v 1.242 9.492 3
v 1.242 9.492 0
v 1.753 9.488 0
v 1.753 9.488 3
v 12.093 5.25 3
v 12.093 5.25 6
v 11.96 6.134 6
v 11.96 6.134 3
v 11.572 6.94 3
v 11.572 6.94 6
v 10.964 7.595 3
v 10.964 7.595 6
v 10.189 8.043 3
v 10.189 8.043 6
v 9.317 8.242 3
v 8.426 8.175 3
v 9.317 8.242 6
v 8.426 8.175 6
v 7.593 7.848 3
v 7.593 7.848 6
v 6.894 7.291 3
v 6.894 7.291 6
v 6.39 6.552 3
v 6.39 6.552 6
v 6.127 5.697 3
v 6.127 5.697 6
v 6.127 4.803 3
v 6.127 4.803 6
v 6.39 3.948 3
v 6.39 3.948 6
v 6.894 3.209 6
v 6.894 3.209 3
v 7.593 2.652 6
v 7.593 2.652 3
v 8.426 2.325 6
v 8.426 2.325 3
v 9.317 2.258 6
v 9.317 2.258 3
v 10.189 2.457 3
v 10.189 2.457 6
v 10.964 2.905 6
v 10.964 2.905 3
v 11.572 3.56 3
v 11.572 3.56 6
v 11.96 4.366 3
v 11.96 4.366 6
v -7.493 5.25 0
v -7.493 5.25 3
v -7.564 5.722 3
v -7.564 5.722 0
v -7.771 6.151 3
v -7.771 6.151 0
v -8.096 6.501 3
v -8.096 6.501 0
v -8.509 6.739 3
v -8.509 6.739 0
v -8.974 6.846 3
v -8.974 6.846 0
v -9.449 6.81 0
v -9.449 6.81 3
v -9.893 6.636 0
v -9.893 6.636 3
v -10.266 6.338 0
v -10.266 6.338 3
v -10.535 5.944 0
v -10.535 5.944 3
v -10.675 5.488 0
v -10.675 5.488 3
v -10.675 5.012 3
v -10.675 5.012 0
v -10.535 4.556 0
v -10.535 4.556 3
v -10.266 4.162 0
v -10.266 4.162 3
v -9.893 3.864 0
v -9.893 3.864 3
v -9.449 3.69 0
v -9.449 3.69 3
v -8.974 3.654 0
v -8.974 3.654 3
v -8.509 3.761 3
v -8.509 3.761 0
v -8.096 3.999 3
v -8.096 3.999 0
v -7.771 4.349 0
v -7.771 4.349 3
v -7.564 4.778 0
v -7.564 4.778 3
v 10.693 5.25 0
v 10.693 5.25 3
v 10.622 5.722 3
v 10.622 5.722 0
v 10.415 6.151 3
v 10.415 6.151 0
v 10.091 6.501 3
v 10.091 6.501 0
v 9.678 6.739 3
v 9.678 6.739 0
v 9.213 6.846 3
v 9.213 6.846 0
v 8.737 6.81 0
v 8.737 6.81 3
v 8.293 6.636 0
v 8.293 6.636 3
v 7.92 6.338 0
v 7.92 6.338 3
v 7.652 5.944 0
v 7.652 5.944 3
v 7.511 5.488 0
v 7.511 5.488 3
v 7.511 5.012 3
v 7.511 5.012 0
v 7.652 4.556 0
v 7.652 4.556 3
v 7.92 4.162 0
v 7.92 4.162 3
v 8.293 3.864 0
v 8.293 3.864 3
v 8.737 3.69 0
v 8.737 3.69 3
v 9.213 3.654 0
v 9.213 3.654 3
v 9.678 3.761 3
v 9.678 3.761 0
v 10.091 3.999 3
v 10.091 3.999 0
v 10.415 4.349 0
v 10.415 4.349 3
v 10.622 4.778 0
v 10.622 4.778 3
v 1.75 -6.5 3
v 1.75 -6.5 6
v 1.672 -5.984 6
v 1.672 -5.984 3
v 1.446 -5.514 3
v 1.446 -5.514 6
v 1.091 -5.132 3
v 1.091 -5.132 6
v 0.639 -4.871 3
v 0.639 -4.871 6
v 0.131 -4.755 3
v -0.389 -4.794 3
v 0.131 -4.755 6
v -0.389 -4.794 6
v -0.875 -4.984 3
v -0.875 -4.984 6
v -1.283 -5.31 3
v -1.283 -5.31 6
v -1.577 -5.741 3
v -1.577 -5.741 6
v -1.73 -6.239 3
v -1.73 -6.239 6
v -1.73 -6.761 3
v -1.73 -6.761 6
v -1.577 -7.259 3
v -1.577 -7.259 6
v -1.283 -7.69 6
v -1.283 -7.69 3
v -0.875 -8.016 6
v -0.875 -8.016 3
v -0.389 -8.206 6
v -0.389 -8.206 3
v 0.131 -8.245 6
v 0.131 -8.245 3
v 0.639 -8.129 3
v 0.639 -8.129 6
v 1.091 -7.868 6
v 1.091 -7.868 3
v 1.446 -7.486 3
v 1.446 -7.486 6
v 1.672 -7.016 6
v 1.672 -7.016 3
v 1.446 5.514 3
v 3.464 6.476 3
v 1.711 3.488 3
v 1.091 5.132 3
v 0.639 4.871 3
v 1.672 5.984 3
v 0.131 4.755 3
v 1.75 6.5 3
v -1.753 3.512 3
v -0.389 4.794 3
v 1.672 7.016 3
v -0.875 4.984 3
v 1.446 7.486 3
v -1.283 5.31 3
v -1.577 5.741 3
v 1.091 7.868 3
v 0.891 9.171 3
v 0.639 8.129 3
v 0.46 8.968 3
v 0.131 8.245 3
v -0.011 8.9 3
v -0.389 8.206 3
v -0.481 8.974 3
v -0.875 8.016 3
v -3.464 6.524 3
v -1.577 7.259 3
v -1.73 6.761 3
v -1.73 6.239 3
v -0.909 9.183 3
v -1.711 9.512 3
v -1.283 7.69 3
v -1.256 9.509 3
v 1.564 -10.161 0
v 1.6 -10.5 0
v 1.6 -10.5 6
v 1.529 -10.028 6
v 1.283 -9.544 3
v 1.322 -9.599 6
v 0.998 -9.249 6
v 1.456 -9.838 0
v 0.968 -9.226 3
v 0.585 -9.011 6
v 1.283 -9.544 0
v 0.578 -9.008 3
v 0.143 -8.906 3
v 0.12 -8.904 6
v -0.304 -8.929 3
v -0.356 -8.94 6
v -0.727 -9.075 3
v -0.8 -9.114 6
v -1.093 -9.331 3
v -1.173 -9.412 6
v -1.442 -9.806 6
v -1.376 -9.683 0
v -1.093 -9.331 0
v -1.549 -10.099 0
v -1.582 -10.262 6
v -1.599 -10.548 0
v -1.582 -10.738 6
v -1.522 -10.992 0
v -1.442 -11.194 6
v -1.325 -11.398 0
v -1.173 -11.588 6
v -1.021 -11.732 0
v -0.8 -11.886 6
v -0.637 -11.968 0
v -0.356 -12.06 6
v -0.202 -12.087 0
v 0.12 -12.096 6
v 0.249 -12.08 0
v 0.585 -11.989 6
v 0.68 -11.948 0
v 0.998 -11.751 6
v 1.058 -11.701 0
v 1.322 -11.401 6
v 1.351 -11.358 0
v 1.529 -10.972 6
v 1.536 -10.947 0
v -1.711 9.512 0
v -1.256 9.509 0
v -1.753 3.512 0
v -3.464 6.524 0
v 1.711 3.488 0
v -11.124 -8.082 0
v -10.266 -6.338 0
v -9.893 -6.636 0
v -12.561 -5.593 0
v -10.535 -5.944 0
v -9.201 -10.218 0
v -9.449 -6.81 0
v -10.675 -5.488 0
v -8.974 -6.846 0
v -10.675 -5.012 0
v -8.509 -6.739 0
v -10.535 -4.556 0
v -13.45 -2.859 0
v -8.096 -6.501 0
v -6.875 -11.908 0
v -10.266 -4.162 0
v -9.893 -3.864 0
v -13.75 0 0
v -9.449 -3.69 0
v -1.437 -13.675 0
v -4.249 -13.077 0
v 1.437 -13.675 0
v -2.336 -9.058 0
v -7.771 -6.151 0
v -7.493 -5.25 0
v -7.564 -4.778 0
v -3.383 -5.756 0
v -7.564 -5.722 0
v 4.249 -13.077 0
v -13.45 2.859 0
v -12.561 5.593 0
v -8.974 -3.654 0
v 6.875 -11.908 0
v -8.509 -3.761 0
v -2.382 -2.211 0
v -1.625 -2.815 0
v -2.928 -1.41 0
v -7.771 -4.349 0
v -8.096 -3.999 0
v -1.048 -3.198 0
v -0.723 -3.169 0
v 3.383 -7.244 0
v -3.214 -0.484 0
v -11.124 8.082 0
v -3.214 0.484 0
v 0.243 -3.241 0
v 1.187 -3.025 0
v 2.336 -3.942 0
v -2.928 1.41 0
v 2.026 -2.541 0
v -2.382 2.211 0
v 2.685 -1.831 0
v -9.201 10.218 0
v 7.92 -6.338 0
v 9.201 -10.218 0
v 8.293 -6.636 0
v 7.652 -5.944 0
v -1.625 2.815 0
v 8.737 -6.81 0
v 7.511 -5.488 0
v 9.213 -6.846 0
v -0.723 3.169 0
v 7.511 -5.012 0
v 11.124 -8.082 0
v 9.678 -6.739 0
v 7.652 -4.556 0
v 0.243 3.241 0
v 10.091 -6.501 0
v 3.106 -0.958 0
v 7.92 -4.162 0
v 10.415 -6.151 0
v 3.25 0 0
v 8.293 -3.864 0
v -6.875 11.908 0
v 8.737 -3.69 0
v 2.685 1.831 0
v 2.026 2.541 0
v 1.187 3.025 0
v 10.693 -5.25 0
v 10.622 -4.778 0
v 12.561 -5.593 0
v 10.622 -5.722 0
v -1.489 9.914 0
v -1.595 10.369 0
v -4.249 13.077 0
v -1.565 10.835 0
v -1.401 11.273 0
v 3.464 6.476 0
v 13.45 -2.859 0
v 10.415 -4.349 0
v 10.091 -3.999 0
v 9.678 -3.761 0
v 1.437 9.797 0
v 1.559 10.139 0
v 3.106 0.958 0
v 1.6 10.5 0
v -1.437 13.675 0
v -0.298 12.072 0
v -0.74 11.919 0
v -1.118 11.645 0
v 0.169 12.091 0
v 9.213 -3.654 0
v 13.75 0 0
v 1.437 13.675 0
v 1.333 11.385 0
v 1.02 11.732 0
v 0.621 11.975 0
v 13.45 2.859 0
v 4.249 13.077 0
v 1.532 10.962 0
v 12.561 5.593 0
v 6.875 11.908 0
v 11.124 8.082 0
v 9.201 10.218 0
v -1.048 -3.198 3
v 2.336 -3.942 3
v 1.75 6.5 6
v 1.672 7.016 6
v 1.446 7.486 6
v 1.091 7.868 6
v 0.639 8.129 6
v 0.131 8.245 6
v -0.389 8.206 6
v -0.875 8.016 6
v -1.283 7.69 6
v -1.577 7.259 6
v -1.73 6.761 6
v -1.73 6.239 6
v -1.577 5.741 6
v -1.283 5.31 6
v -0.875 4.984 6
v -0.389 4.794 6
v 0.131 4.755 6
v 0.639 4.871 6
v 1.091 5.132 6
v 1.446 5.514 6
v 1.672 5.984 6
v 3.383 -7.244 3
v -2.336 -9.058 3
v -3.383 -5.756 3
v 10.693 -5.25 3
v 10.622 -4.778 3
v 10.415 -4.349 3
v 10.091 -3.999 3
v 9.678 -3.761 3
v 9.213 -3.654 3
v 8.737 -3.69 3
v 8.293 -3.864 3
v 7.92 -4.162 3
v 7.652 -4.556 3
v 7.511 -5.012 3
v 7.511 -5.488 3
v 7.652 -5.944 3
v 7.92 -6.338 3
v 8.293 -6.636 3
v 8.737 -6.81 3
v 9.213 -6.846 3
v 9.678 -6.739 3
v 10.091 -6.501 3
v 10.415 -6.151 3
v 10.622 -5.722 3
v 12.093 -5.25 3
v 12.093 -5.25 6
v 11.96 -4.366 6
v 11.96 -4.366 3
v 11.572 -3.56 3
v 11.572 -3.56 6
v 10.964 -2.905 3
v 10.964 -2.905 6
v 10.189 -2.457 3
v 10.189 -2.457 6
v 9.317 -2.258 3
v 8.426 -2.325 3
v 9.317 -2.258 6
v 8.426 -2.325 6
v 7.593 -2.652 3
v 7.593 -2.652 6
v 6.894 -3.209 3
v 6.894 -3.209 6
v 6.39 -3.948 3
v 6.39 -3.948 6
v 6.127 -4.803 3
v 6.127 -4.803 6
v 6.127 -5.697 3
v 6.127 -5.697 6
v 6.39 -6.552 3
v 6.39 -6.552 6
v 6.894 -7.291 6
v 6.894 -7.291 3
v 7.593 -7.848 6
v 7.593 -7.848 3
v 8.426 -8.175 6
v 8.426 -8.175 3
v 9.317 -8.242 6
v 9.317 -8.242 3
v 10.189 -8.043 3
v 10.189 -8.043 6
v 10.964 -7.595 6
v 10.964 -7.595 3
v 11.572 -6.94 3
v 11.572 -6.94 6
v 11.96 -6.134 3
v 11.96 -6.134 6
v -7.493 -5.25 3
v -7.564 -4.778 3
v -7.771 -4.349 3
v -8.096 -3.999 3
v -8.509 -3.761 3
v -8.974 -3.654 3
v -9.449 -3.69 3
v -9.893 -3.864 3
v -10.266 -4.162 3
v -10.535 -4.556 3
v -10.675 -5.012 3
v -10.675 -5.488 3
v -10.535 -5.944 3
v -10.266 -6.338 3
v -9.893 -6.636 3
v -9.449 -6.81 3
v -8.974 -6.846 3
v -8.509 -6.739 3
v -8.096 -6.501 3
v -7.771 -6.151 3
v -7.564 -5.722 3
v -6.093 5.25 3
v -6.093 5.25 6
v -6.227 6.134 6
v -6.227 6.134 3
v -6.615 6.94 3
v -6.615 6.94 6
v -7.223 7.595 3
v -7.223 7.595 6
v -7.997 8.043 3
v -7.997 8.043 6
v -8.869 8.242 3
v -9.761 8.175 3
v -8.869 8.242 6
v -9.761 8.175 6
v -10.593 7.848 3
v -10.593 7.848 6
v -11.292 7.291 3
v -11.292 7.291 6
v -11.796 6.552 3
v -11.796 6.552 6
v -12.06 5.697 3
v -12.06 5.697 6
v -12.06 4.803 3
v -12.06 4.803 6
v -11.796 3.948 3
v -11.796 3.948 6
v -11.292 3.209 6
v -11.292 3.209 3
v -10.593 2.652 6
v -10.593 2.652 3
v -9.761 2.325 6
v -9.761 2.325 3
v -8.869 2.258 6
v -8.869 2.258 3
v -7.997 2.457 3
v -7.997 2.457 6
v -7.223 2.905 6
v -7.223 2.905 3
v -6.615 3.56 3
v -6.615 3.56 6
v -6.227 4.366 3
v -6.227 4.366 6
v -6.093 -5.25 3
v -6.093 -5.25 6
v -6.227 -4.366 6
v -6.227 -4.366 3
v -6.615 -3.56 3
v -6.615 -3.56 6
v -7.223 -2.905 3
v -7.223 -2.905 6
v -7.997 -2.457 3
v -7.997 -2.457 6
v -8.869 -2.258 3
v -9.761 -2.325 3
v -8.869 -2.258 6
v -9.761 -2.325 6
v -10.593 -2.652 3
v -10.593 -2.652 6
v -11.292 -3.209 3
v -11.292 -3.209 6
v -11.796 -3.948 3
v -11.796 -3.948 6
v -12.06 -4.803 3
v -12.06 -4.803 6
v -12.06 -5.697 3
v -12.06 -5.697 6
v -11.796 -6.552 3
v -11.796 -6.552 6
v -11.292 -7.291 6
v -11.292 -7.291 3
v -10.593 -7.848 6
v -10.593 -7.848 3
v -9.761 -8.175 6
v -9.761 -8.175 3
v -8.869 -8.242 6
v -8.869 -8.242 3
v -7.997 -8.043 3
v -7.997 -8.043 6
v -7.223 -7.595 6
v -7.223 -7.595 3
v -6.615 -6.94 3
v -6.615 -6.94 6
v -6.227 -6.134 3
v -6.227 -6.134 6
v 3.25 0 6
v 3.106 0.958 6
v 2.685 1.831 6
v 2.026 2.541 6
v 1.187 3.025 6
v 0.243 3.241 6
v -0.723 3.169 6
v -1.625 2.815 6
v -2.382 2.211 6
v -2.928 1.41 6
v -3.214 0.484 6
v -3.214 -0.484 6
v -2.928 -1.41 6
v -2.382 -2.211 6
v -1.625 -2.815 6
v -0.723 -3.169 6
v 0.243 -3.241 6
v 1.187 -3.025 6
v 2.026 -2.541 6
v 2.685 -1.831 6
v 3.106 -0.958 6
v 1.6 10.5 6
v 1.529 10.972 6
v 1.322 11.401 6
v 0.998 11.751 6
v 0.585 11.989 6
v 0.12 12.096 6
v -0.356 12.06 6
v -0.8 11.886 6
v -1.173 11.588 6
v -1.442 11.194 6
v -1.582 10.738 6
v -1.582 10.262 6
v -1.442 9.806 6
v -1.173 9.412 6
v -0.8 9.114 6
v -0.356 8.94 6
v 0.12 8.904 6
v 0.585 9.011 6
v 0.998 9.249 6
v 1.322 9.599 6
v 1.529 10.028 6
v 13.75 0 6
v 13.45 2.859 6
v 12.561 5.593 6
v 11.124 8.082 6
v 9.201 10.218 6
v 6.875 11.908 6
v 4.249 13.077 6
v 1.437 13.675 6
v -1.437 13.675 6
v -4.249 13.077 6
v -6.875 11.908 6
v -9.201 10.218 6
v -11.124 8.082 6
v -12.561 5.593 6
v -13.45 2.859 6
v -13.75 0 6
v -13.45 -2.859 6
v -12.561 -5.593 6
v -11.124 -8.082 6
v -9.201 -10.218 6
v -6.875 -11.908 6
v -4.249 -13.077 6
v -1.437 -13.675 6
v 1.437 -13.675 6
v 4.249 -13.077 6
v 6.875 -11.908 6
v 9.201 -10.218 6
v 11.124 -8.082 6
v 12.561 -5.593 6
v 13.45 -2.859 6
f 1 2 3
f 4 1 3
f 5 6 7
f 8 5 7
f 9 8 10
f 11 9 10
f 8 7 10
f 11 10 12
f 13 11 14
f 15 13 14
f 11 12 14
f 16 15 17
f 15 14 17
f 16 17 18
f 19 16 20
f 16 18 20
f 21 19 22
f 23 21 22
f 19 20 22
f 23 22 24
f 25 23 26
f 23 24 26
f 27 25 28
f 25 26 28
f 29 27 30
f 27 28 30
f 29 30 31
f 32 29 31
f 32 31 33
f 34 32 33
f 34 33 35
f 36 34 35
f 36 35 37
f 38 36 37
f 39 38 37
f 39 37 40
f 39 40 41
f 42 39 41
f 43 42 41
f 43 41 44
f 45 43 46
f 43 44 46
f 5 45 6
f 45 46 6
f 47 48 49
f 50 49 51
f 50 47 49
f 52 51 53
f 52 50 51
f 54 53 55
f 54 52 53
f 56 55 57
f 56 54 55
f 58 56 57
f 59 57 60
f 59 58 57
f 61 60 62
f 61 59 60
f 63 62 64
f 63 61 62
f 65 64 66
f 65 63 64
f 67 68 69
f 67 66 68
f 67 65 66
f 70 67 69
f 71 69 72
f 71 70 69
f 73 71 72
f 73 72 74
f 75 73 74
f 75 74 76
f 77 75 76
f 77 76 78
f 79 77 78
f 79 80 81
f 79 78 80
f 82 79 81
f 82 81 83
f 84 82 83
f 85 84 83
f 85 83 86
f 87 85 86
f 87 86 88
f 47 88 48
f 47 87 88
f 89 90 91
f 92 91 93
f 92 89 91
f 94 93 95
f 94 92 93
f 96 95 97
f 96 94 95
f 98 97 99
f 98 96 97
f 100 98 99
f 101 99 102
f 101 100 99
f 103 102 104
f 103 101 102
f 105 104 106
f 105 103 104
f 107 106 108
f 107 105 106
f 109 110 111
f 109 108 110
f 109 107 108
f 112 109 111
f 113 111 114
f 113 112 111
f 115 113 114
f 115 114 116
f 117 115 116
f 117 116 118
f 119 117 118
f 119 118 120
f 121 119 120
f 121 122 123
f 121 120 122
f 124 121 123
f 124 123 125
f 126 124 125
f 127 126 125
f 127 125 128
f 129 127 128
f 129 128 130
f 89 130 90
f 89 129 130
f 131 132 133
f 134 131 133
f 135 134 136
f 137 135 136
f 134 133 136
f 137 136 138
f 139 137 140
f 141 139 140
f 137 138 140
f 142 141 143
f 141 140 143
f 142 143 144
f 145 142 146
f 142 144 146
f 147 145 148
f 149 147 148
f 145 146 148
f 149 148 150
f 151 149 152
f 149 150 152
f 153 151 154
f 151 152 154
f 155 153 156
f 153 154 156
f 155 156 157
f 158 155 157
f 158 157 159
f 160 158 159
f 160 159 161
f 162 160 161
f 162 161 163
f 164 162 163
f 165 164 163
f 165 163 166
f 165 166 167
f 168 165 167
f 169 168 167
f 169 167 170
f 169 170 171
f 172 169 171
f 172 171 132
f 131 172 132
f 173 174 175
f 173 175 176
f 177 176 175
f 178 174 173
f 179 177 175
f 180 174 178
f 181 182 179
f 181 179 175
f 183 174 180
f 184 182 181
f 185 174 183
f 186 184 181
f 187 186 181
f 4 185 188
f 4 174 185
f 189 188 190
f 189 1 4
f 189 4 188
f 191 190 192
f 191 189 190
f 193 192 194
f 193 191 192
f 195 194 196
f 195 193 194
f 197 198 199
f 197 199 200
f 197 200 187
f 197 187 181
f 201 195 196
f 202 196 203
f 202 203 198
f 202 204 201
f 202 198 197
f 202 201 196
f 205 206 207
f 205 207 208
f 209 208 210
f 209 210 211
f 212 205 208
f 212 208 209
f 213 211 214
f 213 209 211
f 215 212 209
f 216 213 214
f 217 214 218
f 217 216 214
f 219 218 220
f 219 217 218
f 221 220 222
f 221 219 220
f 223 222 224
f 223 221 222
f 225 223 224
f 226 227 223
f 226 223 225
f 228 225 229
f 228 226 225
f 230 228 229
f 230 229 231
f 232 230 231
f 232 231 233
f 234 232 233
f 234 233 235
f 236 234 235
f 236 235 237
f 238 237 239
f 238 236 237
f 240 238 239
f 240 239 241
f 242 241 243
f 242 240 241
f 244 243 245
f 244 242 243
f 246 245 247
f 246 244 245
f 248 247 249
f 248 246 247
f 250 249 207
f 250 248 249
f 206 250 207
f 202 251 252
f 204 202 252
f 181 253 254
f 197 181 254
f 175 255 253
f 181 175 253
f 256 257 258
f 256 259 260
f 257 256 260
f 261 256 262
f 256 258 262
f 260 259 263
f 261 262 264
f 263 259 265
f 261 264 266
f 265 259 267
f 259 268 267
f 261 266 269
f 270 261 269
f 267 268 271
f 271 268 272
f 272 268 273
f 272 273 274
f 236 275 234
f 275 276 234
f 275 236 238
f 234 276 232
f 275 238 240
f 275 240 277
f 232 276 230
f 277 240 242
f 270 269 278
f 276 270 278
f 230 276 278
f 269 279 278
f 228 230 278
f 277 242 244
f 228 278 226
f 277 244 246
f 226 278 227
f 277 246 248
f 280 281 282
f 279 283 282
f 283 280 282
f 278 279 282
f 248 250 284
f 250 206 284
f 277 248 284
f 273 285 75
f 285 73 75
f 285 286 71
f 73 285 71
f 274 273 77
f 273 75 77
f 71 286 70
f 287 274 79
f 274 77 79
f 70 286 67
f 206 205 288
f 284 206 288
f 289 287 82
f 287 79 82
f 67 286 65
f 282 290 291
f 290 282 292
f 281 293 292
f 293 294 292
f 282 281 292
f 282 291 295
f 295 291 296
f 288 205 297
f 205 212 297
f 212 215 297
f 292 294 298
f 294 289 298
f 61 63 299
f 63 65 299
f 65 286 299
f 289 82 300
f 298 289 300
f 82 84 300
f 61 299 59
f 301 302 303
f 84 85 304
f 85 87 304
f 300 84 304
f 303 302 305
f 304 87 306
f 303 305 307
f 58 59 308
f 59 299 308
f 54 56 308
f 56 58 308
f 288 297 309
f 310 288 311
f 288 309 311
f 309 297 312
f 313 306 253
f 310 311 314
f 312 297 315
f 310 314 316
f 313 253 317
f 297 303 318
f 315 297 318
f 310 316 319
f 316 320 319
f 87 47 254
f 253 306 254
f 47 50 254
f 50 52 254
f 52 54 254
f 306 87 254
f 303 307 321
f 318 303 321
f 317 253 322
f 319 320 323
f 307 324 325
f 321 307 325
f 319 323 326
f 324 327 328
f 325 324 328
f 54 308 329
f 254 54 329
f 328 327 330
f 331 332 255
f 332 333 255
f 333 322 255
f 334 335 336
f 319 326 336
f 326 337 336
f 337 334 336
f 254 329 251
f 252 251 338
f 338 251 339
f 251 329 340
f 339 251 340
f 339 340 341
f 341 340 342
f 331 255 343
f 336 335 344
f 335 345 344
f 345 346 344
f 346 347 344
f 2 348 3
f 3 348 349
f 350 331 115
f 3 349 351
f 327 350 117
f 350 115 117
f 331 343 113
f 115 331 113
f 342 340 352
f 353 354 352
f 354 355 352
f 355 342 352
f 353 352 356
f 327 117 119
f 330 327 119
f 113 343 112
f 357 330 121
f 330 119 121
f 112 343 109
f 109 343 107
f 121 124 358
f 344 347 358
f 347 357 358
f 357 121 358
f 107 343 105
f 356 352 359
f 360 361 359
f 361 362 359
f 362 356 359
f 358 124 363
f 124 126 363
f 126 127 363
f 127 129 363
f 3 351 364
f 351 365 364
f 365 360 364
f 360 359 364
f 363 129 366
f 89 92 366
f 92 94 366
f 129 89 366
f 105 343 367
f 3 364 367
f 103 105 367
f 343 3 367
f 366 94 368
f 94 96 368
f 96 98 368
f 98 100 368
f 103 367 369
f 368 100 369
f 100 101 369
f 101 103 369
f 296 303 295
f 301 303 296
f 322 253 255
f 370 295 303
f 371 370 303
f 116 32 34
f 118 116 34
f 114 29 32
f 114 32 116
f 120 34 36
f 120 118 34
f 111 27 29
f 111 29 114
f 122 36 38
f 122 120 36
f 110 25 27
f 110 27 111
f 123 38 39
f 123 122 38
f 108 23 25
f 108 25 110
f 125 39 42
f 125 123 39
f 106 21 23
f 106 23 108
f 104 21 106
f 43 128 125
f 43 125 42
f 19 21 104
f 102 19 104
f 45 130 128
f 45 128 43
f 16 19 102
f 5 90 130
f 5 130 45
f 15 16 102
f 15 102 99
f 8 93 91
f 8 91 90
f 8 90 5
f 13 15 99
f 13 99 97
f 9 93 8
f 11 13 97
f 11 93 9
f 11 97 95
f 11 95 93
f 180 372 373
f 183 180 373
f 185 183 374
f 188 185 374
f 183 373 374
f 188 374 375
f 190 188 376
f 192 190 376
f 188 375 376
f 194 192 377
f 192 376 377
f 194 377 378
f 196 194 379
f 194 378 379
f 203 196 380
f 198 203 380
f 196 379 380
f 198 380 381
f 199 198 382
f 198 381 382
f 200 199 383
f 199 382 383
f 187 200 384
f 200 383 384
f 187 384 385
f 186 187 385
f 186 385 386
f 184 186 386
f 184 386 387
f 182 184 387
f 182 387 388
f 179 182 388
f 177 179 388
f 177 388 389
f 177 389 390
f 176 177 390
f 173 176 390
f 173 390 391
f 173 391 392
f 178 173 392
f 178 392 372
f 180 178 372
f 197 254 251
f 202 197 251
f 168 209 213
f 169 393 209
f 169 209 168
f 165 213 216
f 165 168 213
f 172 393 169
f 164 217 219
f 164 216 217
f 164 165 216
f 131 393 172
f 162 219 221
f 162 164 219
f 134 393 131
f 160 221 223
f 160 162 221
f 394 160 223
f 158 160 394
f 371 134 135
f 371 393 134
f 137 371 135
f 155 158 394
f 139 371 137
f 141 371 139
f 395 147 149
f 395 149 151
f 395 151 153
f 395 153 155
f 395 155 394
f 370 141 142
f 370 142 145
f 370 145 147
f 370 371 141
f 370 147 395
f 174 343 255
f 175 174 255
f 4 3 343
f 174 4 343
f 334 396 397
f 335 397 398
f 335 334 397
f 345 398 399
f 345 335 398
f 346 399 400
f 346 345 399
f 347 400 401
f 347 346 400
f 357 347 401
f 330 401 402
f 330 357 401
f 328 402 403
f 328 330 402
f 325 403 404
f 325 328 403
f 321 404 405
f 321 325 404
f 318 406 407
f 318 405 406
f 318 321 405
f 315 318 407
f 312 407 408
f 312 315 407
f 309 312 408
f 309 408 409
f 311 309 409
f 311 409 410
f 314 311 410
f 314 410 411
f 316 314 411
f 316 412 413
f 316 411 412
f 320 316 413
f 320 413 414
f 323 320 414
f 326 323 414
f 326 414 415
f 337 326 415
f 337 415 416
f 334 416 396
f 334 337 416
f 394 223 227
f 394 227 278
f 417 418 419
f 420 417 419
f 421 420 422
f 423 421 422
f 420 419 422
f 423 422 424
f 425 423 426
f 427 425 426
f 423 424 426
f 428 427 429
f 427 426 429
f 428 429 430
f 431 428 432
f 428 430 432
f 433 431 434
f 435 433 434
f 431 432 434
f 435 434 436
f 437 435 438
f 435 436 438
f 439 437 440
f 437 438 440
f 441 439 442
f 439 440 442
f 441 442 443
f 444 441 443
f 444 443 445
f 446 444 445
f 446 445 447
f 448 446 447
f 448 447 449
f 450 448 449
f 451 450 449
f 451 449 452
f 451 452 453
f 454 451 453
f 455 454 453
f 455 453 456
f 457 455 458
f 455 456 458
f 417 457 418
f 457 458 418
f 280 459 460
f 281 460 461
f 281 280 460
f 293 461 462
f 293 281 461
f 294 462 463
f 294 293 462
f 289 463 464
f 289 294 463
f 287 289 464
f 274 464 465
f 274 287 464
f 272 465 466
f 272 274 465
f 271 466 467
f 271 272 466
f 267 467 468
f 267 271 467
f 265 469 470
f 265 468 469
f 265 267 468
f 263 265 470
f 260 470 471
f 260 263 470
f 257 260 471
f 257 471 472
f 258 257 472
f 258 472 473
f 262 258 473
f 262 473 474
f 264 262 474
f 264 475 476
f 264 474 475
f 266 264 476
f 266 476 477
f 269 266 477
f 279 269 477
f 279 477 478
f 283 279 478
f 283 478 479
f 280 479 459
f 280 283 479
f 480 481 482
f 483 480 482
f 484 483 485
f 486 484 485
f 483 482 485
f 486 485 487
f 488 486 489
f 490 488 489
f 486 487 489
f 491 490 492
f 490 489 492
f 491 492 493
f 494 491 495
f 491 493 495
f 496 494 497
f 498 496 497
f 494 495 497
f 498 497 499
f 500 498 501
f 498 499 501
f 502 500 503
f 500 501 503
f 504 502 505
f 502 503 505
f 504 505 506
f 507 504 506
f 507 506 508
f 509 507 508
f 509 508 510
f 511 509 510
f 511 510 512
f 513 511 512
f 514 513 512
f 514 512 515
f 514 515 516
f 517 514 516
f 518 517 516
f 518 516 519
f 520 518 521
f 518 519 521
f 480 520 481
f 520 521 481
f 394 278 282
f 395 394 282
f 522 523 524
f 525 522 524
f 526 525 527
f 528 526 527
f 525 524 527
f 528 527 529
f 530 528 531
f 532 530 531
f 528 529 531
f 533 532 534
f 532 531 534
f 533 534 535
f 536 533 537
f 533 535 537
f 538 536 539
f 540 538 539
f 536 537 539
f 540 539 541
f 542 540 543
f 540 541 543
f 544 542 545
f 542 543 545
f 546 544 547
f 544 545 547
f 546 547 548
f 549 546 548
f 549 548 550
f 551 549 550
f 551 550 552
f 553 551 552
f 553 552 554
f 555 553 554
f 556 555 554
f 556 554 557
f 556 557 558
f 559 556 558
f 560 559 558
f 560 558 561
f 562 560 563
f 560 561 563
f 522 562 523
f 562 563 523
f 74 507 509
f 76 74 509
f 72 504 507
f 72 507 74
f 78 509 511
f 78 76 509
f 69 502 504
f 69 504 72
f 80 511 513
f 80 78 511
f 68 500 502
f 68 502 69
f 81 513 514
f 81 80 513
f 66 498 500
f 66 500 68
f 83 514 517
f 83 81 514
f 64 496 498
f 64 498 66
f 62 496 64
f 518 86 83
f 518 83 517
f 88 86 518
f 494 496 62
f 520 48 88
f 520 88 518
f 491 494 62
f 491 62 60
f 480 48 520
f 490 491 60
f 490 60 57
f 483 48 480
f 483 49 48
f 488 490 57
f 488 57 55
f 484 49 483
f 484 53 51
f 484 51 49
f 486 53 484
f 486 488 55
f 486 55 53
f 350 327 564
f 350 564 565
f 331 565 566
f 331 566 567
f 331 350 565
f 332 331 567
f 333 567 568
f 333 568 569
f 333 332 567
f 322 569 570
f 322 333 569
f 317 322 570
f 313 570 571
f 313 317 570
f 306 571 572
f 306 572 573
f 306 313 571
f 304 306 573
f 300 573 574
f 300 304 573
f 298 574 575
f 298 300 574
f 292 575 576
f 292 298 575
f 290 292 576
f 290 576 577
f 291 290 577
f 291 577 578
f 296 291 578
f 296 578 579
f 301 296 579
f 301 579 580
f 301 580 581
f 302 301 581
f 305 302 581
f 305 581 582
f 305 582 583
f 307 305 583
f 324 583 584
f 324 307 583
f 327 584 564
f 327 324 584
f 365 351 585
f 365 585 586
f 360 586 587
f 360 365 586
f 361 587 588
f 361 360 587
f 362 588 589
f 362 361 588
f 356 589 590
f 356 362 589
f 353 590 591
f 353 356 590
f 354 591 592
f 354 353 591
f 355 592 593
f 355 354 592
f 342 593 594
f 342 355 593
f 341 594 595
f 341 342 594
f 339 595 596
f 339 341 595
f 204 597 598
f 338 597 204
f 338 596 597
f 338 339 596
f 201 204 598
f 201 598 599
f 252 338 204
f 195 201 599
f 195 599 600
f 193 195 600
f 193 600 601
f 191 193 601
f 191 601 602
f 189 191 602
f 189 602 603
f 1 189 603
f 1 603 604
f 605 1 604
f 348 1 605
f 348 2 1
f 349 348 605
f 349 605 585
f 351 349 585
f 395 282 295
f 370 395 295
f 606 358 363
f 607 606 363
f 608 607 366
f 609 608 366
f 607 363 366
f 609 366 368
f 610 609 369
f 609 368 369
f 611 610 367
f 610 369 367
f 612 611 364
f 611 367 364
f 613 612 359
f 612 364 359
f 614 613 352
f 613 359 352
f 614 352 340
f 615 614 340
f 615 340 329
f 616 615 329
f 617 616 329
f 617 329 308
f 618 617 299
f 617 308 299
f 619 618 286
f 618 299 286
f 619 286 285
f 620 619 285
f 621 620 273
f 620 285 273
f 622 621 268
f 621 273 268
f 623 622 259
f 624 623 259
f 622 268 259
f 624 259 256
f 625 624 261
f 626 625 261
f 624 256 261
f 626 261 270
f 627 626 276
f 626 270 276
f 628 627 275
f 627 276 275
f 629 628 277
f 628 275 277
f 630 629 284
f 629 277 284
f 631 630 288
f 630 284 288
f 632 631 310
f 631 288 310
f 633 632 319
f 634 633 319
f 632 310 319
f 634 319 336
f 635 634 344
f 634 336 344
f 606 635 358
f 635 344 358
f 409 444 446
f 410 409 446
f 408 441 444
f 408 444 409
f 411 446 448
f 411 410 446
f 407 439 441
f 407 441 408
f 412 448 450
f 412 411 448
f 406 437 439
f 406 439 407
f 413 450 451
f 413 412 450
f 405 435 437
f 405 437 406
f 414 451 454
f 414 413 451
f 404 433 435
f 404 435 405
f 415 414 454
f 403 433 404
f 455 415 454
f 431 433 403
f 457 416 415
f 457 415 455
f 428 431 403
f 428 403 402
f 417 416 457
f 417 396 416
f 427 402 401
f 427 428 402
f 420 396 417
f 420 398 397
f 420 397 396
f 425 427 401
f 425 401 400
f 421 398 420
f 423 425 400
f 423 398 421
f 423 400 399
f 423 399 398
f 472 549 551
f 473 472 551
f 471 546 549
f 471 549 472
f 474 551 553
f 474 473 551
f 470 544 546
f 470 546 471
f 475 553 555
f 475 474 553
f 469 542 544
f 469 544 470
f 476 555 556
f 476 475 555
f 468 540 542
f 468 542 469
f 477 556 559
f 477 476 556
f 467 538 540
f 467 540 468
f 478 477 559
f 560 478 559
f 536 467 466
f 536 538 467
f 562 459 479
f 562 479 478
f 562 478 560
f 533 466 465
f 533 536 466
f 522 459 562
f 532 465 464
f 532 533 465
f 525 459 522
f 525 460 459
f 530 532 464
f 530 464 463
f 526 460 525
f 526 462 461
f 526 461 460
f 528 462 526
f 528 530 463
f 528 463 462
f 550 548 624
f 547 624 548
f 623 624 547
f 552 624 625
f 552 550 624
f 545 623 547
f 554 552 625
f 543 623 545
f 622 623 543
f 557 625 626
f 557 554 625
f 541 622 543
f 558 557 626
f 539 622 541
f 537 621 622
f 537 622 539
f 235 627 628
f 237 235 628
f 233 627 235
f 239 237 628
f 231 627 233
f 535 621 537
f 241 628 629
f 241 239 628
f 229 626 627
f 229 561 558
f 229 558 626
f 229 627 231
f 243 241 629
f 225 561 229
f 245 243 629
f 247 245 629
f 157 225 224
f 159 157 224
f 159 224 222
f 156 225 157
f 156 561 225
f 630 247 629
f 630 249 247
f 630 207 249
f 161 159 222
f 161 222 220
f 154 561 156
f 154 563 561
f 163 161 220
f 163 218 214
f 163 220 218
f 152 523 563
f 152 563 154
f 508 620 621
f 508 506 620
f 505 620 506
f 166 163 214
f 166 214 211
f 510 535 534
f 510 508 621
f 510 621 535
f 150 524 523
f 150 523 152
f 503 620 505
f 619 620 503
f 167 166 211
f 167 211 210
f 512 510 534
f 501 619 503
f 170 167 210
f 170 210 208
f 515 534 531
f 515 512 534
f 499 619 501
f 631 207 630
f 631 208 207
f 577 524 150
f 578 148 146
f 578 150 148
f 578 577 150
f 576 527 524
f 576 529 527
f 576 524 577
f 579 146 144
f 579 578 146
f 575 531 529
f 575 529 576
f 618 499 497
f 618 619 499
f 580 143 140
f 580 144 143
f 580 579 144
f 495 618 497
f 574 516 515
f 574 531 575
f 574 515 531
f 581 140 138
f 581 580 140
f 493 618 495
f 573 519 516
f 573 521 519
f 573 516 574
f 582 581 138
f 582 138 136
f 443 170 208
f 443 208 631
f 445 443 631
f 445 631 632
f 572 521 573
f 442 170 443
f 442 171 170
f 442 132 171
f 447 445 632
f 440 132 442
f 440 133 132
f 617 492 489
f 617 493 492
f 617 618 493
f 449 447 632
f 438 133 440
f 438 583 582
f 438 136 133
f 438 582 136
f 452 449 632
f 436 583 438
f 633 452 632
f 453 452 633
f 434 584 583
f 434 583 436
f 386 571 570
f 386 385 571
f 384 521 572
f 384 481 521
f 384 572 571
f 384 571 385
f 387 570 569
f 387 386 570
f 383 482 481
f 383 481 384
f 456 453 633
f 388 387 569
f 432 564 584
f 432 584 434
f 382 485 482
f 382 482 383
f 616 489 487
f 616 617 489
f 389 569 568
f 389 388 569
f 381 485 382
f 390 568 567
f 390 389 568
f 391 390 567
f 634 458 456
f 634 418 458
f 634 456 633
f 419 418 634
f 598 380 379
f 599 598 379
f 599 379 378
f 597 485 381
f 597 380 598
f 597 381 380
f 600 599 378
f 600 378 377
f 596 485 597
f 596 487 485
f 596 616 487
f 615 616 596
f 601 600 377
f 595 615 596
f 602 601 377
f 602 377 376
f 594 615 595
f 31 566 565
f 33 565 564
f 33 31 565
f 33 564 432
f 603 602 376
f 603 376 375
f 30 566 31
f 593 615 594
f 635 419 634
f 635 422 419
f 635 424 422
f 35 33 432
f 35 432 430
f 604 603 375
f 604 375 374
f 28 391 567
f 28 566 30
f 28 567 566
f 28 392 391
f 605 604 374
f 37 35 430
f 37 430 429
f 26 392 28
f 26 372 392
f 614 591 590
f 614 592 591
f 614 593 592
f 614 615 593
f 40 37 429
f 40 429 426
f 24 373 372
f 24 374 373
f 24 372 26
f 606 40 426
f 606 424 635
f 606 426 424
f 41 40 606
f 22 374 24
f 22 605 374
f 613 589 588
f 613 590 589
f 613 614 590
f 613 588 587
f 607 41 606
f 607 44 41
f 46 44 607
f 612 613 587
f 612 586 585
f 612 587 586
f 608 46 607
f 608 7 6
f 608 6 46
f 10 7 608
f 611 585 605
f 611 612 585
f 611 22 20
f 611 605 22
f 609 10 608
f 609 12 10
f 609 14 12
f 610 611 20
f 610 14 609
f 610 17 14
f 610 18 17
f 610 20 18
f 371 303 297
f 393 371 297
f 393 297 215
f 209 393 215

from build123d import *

# Parameters (mm, degrees)
SKETCH_1_R          = 13.75
SKETCH_1_R_2        = 1.6
SKETCH_1_R_3        = 3.25
EXTRUDE_1_DEPTH     = 6
SKETCH_2_R          = 1.75
CUT_EXTRUDE_1_DEPTH = 7
SKETCH_3_R          = 3
CUT_EXTRUDE_2_DEPTH = 3
CUT_EXTRUDE_6_DEPTH = 3


with BuildPart() as part:
    # ｽｹｯﾁ1 → ﾎﾞｽ - 押し出し1 (new body)
    with BuildSketch(Plane.XY):
        Circle(SKETCH_1_R)
        with Locations((0, 10.5)):
            Circle(SKETCH_1_R_2, mode=Mode.SUBTRACT)
        with Locations((9.09326674, 5.25)):
            Circle(SKETCH_1_R_2, mode=Mode.SUBTRACT)
        with Locations((9.09326674, -5.25)):
            Circle(SKETCH_1_R_2, mode=Mode.SUBTRACT)
        with Locations((0, -10.5)):
            Circle(SKETCH_1_R_2, mode=Mode.SUBTRACT)
        with Locations((-9.09326674, -5.25)):
            Circle(SKETCH_1_R_2, mode=Mode.SUBTRACT)
        with Locations((-9.09326674, 5.25)):
            Circle(SKETCH_1_R_2, mode=Mode.SUBTRACT)
        Circle(SKETCH_1_R_3, mode=Mode.SUBTRACT)
    extrude(amount=EXTRUDE_1_DEPTH)

    # ｽｹｯﾁ2 → ｶｯﾄ - 押し出し1 (cut, through all)
    with BuildSketch(Plane.XY.offset(6)):
        with Locations((0, 6.5)):
            Circle(SKETCH_2_R)
        with Locations((0, -6.5)):
            Circle(SKETCH_2_R)
    extrude(amount=-CUT_EXTRUDE_1_DEPTH, mode=Mode.SUBTRACT)

    # ｽｹｯﾁ3 → ｶｯﾄ - 押し出し2 (cut)
    with BuildSketch(Plane.XY.offset(6)):
        with Locations((9.09326674, 5.25)):
            Circle(SKETCH_3_R)
        with Locations((-9.09326674, -5.25)):
            Circle(SKETCH_3_R)
        with Locations((-9.09326674, 5.25)):
            Circle(SKETCH_3_R)
        with Locations((9.09326674, -5.25)):
            Circle(SKETCH_3_R)
    extrude(amount=-CUT_EXTRUDE_2_DEPTH, mode=Mode.SUBTRACT)

    # ｽｹｯﾁ7 → ｶｯﾄ - 押し出し6 (cut)
    with BuildSketch(Plane(origin=(0, 0, 0), x_dir=(-1, 0, 0), z_dir=(0, 0, -1))):
        Polygon((1.752709389, 3.512022457), (3.464019153, 6.523902085), (1.711309763, 9.511879628), (-1.752709389, 9.487977543), (-3.464019153, 6.476097915), (-1.711309763, 3.488120372), align=None)
        Polygon((2.335754412, -9.058173436), (3.383320389, -5.75626406), (1.047565977, -3.198090624), (-2.335754412, -3.941826564), (-3.383320389, -7.24373594), (-1.047565977, -9.801909376), align=None)
    extrude(amount=-CUT_EXTRUDE_6_DEPTH, mode=Mode.SUBTRACT)


solid = part.part
